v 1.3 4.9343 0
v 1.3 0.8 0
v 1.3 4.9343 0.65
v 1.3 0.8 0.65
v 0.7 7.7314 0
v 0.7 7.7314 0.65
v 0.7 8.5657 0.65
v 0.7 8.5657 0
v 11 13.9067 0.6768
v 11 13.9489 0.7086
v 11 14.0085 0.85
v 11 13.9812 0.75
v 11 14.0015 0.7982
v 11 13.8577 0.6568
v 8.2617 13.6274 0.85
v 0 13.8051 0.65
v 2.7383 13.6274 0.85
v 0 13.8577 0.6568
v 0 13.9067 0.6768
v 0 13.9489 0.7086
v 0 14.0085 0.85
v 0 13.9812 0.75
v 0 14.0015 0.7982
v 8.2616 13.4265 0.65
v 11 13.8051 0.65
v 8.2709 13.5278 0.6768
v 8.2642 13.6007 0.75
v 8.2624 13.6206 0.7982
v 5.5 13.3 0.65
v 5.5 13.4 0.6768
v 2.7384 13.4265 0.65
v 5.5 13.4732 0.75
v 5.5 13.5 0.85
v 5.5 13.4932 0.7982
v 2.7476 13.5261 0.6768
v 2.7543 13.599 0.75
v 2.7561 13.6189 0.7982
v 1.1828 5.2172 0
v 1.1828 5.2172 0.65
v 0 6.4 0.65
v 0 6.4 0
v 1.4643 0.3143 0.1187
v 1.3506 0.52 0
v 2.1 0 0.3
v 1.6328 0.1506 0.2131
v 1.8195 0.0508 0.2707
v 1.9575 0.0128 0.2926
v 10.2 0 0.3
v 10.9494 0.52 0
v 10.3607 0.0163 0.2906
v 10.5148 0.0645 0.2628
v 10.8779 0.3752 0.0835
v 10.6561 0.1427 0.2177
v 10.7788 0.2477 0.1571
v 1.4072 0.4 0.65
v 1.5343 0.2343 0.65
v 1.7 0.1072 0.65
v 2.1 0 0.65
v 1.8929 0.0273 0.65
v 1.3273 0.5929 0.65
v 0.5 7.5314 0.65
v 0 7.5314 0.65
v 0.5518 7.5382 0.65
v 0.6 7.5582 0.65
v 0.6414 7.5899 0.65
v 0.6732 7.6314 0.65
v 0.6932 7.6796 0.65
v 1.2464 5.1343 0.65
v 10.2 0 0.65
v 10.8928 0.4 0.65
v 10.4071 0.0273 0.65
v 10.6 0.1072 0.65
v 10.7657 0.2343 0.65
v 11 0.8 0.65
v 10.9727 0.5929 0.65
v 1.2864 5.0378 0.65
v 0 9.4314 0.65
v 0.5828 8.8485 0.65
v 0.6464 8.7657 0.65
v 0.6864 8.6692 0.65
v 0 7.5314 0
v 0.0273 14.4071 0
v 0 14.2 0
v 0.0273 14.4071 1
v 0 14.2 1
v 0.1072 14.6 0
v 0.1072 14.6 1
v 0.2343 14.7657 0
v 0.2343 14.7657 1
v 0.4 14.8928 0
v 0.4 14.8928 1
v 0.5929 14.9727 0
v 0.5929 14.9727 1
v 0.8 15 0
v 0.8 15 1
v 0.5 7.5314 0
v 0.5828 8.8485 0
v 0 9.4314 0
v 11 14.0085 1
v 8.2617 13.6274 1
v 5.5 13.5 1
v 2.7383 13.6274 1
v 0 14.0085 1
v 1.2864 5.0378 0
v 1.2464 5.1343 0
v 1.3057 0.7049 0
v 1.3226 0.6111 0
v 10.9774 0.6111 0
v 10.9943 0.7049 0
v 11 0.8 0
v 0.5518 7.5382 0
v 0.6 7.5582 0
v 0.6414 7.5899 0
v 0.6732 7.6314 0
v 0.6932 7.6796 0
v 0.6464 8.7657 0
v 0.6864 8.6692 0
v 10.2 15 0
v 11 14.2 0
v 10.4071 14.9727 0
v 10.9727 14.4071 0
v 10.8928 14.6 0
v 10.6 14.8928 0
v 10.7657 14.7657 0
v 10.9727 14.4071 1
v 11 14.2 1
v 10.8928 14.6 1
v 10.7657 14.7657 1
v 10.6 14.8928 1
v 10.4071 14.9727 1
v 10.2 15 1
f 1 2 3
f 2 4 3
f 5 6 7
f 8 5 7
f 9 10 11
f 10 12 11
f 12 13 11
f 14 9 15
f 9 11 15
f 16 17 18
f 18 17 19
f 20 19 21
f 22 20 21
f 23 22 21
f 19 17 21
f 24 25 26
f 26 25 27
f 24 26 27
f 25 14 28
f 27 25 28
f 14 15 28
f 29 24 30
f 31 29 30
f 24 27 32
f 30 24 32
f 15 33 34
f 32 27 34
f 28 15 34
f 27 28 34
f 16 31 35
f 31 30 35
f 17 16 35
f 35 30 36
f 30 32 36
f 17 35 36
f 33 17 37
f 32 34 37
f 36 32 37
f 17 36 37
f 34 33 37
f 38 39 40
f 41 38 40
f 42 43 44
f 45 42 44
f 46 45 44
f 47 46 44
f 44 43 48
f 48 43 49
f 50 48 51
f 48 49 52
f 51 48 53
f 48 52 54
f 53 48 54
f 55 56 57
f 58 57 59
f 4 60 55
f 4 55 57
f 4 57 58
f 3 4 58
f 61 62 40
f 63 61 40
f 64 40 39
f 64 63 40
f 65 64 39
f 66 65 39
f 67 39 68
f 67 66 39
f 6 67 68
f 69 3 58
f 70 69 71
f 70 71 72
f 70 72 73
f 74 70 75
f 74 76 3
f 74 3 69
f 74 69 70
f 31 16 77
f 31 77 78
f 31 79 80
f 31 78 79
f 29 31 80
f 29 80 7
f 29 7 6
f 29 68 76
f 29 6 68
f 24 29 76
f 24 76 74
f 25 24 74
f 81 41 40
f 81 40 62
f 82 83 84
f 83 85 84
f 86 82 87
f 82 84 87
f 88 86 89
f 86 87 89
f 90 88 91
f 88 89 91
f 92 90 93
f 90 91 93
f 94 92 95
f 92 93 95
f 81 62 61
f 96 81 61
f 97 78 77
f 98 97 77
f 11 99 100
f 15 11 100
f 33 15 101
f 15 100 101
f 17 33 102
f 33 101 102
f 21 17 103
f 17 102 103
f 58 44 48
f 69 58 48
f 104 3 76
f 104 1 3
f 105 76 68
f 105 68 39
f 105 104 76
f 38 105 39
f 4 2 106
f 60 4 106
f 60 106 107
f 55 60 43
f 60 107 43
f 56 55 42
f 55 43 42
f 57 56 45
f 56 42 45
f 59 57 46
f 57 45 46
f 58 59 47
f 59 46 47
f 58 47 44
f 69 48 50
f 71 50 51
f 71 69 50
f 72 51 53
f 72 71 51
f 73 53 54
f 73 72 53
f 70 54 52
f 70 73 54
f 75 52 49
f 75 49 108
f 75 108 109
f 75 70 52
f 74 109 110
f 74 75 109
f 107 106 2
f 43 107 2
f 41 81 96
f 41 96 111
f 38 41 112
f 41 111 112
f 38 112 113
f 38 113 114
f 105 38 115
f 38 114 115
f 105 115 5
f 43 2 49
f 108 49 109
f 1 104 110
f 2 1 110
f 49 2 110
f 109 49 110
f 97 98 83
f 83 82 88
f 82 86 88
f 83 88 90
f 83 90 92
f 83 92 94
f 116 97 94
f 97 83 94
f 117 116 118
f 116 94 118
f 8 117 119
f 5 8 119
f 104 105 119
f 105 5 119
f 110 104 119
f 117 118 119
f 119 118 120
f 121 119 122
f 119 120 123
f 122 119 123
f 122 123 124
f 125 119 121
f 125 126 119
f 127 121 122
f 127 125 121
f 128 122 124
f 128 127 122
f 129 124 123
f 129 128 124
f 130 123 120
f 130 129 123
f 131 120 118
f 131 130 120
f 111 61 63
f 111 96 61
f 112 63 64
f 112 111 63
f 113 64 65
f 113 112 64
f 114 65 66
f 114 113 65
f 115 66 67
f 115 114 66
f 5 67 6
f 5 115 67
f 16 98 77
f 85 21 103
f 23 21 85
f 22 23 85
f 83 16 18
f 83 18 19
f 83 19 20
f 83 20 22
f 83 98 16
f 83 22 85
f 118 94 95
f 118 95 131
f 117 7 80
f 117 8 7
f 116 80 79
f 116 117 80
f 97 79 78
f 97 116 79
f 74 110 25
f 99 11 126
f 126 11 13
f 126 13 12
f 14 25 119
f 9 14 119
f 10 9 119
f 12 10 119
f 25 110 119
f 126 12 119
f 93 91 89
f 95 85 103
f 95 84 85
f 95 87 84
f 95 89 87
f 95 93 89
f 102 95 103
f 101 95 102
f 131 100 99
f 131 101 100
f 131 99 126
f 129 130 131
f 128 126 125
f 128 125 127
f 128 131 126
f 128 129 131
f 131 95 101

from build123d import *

# Parameters (mm, degrees)
F0_W      = 11
F0_H      = 15
F1_DEPTH  = 1
F3_DEPTH  = 0.35
F5_DEPTH  = 0.65
F6_R      = 0.2
F7_R      = 0.4
F8_R      = 0.2
F9_R      = 0.4
F11_DEPTH = 9.7
F12_R     = 0.8


with BuildPart() as f1:
    # F0 (on Top) → F1 (new body)
    with BuildSketch(Plane.XY):
        with Locations((5.5, 7.5)):
            Rectangle(F0_W, F0_H)
    extrude(amount=F1_DEPTH)

    # F2 (on face) → F3 (cut)
    with BuildSketch(Plane.XY.offset(1)):
        with BuildLine():
            Line((0, 14.0084757939), (0, 0))
            Line((0, 0), (11, 0))
            Line((11, 0), (11, 14.0084757939))
            ThreePointArc((11, 14.0084757939), (5.5, 13.5), (0, 14.0084757939))
        make_face()
    extrude(amount=-F3_DEPTH, mode=Mode.SUBTRACT)

    # F4 (on face) → F5 (cut, through all)
    with BuildSketch(Plane.XY.offset(0.65)):
        Polygon((0, 0), (1.3, 0), (1.3, 5.1), (0, 6.4), align=None)
        Polygon((0, 9.4313708499), (0, 7.5313708499), (0.7, 7.5313708499), (0.7, 8.7313708499), align=None)
    extrude(amount=-F5_DEPTH, mode=Mode.SUBTRACT)

    # F6
    f6_edges = [f1.edges().sort_by_distance(p)[0] for p in [
        (0.7, 7.531371, 0.325),
    ]]
    fillet(f6_edges, radius=F6_R)

    # F7
    f7_edges = [f1.edges().sort_by_distance(p)[0] for p in [
        (0.7, 8.731371, 0.325),
    ]]
    fillet(f7_edges, radius=F7_R)

    # F8
    f8_edges = [f1.edges().sort_by_distance(p)[0] for p in [
        (5.5, 13.5, 0.65),
    ]]
    fillet(f8_edges, radius=F8_R)

    # F9
    f9_edges = [f1.edges().sort_by_distance(p)[0] for p in [
        (1.3, 5.1, 0.325),
    ]]
    fillet(f9_edges, radius=F9_R)

    # F10 (on face) → F11 (cut, through all)
    with BuildSketch(Plane.YZ.offset(11)):
        Polygon((0.52, 0), (0, 0.3), (0, 0), align=None)
    extrude(amount=-F11_DEPTH, mode=Mode.SUBTRACT)

    # F12
    f12_edges = [f1.edges().sort_by_distance(p)[0] for p in [
        (11, 0, 0.475),
        (1.3, 0, 0.475),
        (0, 15, 0.5),
        (11, 15, 0.5),
    ]]
    fillet(f12_edges, radius=F12_R)


solid = f1.part
